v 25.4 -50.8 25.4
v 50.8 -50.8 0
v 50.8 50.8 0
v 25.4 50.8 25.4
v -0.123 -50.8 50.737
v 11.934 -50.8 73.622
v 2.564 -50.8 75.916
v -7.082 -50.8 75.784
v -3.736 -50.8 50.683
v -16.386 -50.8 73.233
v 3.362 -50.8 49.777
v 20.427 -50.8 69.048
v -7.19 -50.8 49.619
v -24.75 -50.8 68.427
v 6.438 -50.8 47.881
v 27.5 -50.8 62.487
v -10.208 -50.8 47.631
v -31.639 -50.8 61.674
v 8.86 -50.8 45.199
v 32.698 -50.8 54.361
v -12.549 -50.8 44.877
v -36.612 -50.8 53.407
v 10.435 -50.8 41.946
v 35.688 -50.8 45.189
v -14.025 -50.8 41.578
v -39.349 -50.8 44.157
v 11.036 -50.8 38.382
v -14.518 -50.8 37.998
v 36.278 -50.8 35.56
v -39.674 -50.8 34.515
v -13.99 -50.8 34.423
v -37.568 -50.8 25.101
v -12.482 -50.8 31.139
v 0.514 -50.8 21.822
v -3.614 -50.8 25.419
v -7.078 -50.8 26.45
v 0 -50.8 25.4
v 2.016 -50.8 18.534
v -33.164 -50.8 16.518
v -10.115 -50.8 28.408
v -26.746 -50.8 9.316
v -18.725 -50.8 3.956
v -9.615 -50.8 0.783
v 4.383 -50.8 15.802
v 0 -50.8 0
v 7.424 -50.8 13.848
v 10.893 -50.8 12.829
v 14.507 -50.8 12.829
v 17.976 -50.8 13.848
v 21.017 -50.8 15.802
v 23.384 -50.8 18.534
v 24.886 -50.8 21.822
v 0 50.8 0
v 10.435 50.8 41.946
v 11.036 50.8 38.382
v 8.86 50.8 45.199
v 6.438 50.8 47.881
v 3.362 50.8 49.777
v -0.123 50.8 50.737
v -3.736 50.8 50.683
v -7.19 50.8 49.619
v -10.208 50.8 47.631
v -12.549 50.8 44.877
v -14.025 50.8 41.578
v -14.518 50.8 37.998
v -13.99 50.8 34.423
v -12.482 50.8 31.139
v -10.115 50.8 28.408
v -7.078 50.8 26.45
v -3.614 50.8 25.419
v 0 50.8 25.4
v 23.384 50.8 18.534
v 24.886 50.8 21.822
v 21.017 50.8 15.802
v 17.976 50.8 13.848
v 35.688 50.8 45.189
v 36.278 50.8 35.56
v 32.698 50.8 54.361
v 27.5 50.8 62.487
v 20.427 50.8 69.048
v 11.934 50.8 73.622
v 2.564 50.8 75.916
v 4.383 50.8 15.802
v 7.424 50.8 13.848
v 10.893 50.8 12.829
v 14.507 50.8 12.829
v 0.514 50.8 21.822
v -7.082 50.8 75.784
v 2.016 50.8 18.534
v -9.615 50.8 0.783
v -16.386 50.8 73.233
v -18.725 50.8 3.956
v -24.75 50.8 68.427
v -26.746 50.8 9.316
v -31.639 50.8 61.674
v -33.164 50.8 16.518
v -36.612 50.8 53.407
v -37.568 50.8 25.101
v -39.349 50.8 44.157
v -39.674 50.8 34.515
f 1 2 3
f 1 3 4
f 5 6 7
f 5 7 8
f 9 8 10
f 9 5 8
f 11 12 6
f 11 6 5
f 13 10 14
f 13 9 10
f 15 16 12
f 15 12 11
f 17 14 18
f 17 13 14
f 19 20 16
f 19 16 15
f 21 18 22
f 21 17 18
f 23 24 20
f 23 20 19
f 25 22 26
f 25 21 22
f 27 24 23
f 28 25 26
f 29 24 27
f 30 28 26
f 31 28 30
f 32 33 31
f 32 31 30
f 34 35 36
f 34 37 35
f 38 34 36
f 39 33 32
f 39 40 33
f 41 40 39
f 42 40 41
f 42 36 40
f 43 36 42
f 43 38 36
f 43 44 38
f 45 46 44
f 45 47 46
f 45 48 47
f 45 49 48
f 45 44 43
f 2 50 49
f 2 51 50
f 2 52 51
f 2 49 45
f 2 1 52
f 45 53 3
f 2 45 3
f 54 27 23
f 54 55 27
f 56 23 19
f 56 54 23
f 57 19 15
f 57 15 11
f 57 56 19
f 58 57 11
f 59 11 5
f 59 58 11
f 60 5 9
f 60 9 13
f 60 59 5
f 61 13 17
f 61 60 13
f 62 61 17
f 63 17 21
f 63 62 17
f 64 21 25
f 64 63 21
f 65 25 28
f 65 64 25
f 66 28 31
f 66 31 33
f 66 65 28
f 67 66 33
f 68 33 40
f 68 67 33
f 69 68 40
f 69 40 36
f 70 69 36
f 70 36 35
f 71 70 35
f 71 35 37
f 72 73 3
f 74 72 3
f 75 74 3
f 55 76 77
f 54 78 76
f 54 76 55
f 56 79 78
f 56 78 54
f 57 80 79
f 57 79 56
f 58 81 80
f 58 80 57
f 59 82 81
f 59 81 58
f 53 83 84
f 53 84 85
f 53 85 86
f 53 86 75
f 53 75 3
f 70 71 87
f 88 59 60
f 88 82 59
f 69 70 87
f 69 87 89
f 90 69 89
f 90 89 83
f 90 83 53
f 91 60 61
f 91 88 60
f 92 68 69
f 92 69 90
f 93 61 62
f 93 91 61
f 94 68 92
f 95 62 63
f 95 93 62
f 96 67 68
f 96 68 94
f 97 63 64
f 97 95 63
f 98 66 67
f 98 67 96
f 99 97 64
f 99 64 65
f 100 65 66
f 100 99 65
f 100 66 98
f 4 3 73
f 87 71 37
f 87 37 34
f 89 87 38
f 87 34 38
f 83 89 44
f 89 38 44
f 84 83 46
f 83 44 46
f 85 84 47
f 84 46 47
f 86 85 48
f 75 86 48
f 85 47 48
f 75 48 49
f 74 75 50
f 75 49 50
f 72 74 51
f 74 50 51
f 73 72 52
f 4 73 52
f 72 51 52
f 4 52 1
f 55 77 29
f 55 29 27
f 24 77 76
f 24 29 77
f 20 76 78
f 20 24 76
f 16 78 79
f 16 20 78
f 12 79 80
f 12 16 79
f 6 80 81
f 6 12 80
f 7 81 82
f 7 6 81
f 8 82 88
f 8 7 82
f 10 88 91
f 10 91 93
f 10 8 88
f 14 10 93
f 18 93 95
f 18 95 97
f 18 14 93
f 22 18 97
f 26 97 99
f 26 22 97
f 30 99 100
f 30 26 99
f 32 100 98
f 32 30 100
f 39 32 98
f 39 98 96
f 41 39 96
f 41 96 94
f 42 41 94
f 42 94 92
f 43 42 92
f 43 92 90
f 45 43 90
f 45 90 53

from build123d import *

# Parameters (mm, degrees)
F1_DEPTH      = 50.8
F1_DEPTH_BACK = 50.8
F2_DEPTH      = 101.601
F1_FACE1_W    = 101.6
F1_FACE1_H    = 25.4


with BuildPart() as f1:
    # F0 (on Front) → F1 (new body, two sides)
    with BuildSketch(Plane.XZ) as f1_sk:
        Polygon((0, 25.4), (0, 0), (50.8, 0), (25.4, 25.4), align=None)
    extrude(amount=F1_DEPTH)
    extrude(f1_sk.sketch, amount=-F1_DEPTH_BACK)

    # F6 (on face) → F2 (cut, through all)
    with BuildSketch(Plane.XZ.offset(50.8)):
        with BuildLine():
            Line((0, 25.4), (25.4, 25.4))
            ThreePointArc((25.4, 25.4), (12.7, 38.1), (0, 25.4))
        make_face()
        with BuildLine():
            ThreePointArc((0, 25.4), (12.7, 12.7), (25.4, 25.4))
            Line((25.4, 25.4), (0, 25.4))
        make_face()
    extrude(amount=-F2_DEPTH, mode=Mode.SUBTRACT)

    # F4: sweep along a path in F3
    with BuildLine(Plane.XZ) as f4_path:
        ThreePointArc((36.278456417, 35.56), (-28.4094161115, 65.2691159795), (0, 0))
    # F1_face1 (on face) → F4 (sweep)
    with BuildSketch(Plane(origin=(0, 0, 12.7), x_dir=(0, -1, 0), z_dir=(-1, 0, 0))):
        Rectangle(F1_FACE1_W, F1_FACE1_H)
    sweep(path=f4_path.line)


solid = f1.part
